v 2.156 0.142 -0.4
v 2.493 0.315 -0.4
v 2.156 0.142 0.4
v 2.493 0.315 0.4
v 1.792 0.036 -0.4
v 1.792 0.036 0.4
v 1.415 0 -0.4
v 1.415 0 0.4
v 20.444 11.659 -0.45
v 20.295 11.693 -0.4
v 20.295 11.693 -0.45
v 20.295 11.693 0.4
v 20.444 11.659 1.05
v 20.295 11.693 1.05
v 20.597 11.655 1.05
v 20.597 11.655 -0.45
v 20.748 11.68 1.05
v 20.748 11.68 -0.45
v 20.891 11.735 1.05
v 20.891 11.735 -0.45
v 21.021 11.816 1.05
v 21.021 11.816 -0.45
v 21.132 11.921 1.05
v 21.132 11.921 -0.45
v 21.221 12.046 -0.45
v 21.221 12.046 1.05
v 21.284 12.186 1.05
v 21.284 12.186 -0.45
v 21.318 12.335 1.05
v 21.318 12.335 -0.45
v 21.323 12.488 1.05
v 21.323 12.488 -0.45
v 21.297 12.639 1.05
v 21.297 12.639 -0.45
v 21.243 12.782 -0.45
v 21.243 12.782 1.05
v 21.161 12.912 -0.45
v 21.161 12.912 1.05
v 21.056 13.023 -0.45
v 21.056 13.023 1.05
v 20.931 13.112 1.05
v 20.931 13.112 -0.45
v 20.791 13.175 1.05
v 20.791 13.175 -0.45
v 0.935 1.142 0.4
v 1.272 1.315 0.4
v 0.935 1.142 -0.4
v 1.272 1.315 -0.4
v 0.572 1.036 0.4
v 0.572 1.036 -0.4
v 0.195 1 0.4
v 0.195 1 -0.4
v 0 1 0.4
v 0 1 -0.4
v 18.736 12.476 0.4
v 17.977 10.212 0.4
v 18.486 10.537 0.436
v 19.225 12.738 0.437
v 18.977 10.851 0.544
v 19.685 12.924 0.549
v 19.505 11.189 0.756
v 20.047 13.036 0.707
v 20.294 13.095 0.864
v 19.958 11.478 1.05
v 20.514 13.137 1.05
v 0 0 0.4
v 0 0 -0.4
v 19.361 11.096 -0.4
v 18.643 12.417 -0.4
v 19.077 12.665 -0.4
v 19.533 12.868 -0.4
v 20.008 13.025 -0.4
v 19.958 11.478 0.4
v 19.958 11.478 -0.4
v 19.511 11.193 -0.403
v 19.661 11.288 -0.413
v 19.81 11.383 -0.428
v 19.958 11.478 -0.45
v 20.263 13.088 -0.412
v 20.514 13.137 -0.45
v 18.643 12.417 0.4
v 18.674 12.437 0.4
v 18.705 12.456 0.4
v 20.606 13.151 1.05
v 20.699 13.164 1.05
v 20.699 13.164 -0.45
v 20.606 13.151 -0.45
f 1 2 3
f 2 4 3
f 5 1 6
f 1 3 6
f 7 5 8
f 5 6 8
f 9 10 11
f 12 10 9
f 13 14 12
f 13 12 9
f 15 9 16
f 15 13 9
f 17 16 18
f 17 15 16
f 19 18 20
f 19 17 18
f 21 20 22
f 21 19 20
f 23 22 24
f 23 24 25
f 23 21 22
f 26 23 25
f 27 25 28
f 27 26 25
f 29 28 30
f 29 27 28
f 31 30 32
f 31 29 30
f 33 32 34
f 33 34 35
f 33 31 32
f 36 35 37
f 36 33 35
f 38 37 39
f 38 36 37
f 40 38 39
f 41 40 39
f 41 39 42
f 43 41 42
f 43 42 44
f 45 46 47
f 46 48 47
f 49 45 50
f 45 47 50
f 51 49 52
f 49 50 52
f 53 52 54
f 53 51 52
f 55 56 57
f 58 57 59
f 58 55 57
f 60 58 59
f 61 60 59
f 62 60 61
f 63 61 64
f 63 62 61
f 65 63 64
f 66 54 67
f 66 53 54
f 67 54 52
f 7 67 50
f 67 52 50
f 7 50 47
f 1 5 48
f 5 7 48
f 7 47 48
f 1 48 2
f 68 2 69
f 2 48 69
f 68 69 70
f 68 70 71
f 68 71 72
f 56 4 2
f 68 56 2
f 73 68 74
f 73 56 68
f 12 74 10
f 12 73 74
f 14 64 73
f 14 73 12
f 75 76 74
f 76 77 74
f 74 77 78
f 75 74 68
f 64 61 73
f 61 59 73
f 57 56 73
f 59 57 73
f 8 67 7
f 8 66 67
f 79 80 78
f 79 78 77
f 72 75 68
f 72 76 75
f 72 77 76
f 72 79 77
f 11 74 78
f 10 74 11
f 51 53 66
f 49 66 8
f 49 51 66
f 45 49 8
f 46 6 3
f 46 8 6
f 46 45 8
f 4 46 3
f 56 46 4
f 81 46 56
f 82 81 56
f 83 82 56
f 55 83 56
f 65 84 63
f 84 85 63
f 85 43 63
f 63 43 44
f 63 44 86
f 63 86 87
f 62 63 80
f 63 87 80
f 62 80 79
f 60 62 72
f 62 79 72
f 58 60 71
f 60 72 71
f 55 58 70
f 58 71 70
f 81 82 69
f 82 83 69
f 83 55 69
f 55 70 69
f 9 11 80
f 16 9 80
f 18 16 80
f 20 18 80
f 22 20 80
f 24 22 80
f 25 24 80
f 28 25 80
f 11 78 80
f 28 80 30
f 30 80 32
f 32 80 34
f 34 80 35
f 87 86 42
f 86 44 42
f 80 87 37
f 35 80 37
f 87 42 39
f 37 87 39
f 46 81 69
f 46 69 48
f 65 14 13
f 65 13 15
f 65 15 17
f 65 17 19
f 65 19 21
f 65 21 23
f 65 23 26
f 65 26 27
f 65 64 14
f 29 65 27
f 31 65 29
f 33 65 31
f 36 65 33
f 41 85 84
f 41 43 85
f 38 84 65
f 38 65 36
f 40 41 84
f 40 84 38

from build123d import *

# Parameters (mm, degrees)
BOSS_EXTRUDE1_DEPTH     = 0.4
BOSS_EXTRUDE2_START     = -0.1
BOSS_EXTRUDE2_DEPTH     = 0.75
FILLET1_R               = 2
FILLET2_R               = 2
CUT_EXTRUDE1_DEPTH      = 26.275598114
CUT_EXTRUDE1_DEPTH_BACK = 26.275598114
FILLET3_R               = 5
BOSS_EXTRUDE4_DEPTH     = 1.5


with BuildPart() as part:
    # Sketch1 → Boss-Extrude1 (new, symmetric)
    with BuildSketch(Plane.XY):
        Polygon((0, 0), (2, 0), (20.294681103, 11.693172413), (21.054279514, 13.958892298), (0.779302489, 1), (0, 1), align=None)
    extrude(amount=BOSS_EXTRUDE1_DEPTH, both=True)

    # Sketch2 → Boss-Extrude2 (add, symmetric)
    with BuildSketch(Plane.XY.offset(0.4).offset(BOSS_EXTRUDE2_START)):
        Polygon((21.054279514, 13.958892298), (20.717242005, 13.743472434), (19.957643594, 11.47775255), (20.294681103, 11.693172413), align=None)
    extrude(amount=BOSS_EXTRUDE2_DEPTH, both=True)

    # Fillet1
    fillet1_edges = [part.edges().sort_by_distance(p)[0] for p in [
        (0.779302489, 1, 0),
        (2, 0, 0),
    ]]
    fillet(fillet1_edges, radius=FILLET1_R)

    # Fillet2
    # the kernel refuses this fillet: 2 mm, written as the material it adds along each edge
    with BuildSketch(Plane(origin=(21.070401948, 14.796873144, -0.4), x_dir=(-0.9481347144095073, 0.31786878319772466, 0), z_dir=(-0.3178687831977247, -0.9481347144095074, 0))) as fillet2_piece_1_section:
        with BuildLine():
            CenterArc((0.444409721, 2), FILLET2_R, 257.161431859, 12.838568141)
            Line((0, 0.05), (0, 0))
            Line((0, 0), (0.444409721, 0))
        make_face()
    fillet2_piece_1 = extrude(amount=4.611708902, mode=Mode.PRIVATE)
    fillet2_piece_1 = split(fillet2_piece_1, bisect_by=Plane(origin=(21.445983631, 14.209252703, -0.4), z_dir=(0.5385496583097051, -0.8425937725467118, 0)), keep=Keep.TOP, mode=Mode.PRIVATE)
    fillet2_piece_1 = split(fillet2_piece_1, bisect_by=Plane(origin=(22.253808119, 12.945362044, -0.4), z_dir=(-0.538549658309705, 0.8425937725467119, 0)), keep=Keep.TOP, mode=Mode.PRIVATE)
    add(fillet2_piece_1)
    with BuildSketch(Plane(origin=(21.889888122, 17.241225439, 0.4), x_dir=(-0.9481347144095071, 0.3178687831977246, 0), z_dir=(-0.3178687831977247, -0.9481347144095074, 0))) as fillet2_piece_2_section:
        with BuildLine():
            CenterArc((1.475635456, -2), FILLET2_R, 90, 47.545849796)
            Line((0, -0.65), (0, 0))
            Line((0, 0), (1.475635456, 0))
        make_face()
    fillet2_piece_2 = extrude(amount=9.76783758, mode=Mode.PRIVATE)
    fillet2_piece_2 = split(fillet2_piece_2, bisect_by=Plane(origin=(23.136984265, 15.290067496, 0.4), z_dir=(0.5385496583097051, -0.8425937725467118, 0)), keep=Keep.TOP, mode=Mode.PRIVATE)
    fillet2_piece_2 = split(fillet2_piece_2, bisect_by=Plane(origin=(23.944808753, 14.026176837, 0.4), z_dir=(-0.538549658309705, 0.8425937725467119, 0)), keep=Keep.TOP, mode=Mode.PRIVATE)
    add(fillet2_piece_2)

    # Sketch4 → Cut-Extrude1 (cut, two sides: drawn at the far end of the back side and taken through both)
    with BuildSketch(Plane.XY.offset(0.4).offset(-CUT_EXTRUDE1_DEPTH_BACK)):
        Polygon((17.612630282, 13.011216265), (21.976187612, 13.235824871), (21.976187612, 14.520118874), (17.612630282, 14.232504072), align=None)
    extrude(amount=CUT_EXTRUDE1_DEPTH + CUT_EXTRUDE1_DEPTH_BACK, mode=Mode.SUBTRACT)

    # Fillet3
    # the kernel refuses this fillet: 5 mm, written as the material it takes off along each edge
    with BuildSketch(Plane(origin=(19.743162439, 13.120882718, -3.665218242), x_dir=(-0.8425937725466615, -0.5385496583097837, 0), z_dir=(0, 0, 1))) as fillet3_piece_1:
        with BuildLine():
            CenterArc((1.306087297, 5), FILLET3_R, 243.661056807, 26.338943193)
            Line((-0.912314796, 0.519074632), (-0.956682838, 0.429456124))
            ThreePointArc((-0.956682838, 0.429456124), (-0.505609749, 0.172620891), (-0.049452351, -0.086916425))
            Line((-0.049452351, -0.086916425), (0, -0.1))
            Line((0, -0.1), (1.306087297, -0.1))
            Line((1.306087297, -0.1), (1.306087297, 0))
        make_face()
    extrude(amount=7.476378223, mode=Mode.SUBTRACT)

    # Sketch5 → Boss-Extrude4 (add)
    with BuildSketch(Plane.XY.offset(1.05)):
        with BuildLine():
            Line((20.79142067, 13.174840488), (20.294681103, 11.693172413))
            ThreePointArc((20.294681103, 11.693172413), (21.283884924, 12.185636667), (20.79142067, 13.174840488))
        make_face()
    extrude(amount=-BOSS_EXTRUDE4_DEPTH)


solid = part.part
